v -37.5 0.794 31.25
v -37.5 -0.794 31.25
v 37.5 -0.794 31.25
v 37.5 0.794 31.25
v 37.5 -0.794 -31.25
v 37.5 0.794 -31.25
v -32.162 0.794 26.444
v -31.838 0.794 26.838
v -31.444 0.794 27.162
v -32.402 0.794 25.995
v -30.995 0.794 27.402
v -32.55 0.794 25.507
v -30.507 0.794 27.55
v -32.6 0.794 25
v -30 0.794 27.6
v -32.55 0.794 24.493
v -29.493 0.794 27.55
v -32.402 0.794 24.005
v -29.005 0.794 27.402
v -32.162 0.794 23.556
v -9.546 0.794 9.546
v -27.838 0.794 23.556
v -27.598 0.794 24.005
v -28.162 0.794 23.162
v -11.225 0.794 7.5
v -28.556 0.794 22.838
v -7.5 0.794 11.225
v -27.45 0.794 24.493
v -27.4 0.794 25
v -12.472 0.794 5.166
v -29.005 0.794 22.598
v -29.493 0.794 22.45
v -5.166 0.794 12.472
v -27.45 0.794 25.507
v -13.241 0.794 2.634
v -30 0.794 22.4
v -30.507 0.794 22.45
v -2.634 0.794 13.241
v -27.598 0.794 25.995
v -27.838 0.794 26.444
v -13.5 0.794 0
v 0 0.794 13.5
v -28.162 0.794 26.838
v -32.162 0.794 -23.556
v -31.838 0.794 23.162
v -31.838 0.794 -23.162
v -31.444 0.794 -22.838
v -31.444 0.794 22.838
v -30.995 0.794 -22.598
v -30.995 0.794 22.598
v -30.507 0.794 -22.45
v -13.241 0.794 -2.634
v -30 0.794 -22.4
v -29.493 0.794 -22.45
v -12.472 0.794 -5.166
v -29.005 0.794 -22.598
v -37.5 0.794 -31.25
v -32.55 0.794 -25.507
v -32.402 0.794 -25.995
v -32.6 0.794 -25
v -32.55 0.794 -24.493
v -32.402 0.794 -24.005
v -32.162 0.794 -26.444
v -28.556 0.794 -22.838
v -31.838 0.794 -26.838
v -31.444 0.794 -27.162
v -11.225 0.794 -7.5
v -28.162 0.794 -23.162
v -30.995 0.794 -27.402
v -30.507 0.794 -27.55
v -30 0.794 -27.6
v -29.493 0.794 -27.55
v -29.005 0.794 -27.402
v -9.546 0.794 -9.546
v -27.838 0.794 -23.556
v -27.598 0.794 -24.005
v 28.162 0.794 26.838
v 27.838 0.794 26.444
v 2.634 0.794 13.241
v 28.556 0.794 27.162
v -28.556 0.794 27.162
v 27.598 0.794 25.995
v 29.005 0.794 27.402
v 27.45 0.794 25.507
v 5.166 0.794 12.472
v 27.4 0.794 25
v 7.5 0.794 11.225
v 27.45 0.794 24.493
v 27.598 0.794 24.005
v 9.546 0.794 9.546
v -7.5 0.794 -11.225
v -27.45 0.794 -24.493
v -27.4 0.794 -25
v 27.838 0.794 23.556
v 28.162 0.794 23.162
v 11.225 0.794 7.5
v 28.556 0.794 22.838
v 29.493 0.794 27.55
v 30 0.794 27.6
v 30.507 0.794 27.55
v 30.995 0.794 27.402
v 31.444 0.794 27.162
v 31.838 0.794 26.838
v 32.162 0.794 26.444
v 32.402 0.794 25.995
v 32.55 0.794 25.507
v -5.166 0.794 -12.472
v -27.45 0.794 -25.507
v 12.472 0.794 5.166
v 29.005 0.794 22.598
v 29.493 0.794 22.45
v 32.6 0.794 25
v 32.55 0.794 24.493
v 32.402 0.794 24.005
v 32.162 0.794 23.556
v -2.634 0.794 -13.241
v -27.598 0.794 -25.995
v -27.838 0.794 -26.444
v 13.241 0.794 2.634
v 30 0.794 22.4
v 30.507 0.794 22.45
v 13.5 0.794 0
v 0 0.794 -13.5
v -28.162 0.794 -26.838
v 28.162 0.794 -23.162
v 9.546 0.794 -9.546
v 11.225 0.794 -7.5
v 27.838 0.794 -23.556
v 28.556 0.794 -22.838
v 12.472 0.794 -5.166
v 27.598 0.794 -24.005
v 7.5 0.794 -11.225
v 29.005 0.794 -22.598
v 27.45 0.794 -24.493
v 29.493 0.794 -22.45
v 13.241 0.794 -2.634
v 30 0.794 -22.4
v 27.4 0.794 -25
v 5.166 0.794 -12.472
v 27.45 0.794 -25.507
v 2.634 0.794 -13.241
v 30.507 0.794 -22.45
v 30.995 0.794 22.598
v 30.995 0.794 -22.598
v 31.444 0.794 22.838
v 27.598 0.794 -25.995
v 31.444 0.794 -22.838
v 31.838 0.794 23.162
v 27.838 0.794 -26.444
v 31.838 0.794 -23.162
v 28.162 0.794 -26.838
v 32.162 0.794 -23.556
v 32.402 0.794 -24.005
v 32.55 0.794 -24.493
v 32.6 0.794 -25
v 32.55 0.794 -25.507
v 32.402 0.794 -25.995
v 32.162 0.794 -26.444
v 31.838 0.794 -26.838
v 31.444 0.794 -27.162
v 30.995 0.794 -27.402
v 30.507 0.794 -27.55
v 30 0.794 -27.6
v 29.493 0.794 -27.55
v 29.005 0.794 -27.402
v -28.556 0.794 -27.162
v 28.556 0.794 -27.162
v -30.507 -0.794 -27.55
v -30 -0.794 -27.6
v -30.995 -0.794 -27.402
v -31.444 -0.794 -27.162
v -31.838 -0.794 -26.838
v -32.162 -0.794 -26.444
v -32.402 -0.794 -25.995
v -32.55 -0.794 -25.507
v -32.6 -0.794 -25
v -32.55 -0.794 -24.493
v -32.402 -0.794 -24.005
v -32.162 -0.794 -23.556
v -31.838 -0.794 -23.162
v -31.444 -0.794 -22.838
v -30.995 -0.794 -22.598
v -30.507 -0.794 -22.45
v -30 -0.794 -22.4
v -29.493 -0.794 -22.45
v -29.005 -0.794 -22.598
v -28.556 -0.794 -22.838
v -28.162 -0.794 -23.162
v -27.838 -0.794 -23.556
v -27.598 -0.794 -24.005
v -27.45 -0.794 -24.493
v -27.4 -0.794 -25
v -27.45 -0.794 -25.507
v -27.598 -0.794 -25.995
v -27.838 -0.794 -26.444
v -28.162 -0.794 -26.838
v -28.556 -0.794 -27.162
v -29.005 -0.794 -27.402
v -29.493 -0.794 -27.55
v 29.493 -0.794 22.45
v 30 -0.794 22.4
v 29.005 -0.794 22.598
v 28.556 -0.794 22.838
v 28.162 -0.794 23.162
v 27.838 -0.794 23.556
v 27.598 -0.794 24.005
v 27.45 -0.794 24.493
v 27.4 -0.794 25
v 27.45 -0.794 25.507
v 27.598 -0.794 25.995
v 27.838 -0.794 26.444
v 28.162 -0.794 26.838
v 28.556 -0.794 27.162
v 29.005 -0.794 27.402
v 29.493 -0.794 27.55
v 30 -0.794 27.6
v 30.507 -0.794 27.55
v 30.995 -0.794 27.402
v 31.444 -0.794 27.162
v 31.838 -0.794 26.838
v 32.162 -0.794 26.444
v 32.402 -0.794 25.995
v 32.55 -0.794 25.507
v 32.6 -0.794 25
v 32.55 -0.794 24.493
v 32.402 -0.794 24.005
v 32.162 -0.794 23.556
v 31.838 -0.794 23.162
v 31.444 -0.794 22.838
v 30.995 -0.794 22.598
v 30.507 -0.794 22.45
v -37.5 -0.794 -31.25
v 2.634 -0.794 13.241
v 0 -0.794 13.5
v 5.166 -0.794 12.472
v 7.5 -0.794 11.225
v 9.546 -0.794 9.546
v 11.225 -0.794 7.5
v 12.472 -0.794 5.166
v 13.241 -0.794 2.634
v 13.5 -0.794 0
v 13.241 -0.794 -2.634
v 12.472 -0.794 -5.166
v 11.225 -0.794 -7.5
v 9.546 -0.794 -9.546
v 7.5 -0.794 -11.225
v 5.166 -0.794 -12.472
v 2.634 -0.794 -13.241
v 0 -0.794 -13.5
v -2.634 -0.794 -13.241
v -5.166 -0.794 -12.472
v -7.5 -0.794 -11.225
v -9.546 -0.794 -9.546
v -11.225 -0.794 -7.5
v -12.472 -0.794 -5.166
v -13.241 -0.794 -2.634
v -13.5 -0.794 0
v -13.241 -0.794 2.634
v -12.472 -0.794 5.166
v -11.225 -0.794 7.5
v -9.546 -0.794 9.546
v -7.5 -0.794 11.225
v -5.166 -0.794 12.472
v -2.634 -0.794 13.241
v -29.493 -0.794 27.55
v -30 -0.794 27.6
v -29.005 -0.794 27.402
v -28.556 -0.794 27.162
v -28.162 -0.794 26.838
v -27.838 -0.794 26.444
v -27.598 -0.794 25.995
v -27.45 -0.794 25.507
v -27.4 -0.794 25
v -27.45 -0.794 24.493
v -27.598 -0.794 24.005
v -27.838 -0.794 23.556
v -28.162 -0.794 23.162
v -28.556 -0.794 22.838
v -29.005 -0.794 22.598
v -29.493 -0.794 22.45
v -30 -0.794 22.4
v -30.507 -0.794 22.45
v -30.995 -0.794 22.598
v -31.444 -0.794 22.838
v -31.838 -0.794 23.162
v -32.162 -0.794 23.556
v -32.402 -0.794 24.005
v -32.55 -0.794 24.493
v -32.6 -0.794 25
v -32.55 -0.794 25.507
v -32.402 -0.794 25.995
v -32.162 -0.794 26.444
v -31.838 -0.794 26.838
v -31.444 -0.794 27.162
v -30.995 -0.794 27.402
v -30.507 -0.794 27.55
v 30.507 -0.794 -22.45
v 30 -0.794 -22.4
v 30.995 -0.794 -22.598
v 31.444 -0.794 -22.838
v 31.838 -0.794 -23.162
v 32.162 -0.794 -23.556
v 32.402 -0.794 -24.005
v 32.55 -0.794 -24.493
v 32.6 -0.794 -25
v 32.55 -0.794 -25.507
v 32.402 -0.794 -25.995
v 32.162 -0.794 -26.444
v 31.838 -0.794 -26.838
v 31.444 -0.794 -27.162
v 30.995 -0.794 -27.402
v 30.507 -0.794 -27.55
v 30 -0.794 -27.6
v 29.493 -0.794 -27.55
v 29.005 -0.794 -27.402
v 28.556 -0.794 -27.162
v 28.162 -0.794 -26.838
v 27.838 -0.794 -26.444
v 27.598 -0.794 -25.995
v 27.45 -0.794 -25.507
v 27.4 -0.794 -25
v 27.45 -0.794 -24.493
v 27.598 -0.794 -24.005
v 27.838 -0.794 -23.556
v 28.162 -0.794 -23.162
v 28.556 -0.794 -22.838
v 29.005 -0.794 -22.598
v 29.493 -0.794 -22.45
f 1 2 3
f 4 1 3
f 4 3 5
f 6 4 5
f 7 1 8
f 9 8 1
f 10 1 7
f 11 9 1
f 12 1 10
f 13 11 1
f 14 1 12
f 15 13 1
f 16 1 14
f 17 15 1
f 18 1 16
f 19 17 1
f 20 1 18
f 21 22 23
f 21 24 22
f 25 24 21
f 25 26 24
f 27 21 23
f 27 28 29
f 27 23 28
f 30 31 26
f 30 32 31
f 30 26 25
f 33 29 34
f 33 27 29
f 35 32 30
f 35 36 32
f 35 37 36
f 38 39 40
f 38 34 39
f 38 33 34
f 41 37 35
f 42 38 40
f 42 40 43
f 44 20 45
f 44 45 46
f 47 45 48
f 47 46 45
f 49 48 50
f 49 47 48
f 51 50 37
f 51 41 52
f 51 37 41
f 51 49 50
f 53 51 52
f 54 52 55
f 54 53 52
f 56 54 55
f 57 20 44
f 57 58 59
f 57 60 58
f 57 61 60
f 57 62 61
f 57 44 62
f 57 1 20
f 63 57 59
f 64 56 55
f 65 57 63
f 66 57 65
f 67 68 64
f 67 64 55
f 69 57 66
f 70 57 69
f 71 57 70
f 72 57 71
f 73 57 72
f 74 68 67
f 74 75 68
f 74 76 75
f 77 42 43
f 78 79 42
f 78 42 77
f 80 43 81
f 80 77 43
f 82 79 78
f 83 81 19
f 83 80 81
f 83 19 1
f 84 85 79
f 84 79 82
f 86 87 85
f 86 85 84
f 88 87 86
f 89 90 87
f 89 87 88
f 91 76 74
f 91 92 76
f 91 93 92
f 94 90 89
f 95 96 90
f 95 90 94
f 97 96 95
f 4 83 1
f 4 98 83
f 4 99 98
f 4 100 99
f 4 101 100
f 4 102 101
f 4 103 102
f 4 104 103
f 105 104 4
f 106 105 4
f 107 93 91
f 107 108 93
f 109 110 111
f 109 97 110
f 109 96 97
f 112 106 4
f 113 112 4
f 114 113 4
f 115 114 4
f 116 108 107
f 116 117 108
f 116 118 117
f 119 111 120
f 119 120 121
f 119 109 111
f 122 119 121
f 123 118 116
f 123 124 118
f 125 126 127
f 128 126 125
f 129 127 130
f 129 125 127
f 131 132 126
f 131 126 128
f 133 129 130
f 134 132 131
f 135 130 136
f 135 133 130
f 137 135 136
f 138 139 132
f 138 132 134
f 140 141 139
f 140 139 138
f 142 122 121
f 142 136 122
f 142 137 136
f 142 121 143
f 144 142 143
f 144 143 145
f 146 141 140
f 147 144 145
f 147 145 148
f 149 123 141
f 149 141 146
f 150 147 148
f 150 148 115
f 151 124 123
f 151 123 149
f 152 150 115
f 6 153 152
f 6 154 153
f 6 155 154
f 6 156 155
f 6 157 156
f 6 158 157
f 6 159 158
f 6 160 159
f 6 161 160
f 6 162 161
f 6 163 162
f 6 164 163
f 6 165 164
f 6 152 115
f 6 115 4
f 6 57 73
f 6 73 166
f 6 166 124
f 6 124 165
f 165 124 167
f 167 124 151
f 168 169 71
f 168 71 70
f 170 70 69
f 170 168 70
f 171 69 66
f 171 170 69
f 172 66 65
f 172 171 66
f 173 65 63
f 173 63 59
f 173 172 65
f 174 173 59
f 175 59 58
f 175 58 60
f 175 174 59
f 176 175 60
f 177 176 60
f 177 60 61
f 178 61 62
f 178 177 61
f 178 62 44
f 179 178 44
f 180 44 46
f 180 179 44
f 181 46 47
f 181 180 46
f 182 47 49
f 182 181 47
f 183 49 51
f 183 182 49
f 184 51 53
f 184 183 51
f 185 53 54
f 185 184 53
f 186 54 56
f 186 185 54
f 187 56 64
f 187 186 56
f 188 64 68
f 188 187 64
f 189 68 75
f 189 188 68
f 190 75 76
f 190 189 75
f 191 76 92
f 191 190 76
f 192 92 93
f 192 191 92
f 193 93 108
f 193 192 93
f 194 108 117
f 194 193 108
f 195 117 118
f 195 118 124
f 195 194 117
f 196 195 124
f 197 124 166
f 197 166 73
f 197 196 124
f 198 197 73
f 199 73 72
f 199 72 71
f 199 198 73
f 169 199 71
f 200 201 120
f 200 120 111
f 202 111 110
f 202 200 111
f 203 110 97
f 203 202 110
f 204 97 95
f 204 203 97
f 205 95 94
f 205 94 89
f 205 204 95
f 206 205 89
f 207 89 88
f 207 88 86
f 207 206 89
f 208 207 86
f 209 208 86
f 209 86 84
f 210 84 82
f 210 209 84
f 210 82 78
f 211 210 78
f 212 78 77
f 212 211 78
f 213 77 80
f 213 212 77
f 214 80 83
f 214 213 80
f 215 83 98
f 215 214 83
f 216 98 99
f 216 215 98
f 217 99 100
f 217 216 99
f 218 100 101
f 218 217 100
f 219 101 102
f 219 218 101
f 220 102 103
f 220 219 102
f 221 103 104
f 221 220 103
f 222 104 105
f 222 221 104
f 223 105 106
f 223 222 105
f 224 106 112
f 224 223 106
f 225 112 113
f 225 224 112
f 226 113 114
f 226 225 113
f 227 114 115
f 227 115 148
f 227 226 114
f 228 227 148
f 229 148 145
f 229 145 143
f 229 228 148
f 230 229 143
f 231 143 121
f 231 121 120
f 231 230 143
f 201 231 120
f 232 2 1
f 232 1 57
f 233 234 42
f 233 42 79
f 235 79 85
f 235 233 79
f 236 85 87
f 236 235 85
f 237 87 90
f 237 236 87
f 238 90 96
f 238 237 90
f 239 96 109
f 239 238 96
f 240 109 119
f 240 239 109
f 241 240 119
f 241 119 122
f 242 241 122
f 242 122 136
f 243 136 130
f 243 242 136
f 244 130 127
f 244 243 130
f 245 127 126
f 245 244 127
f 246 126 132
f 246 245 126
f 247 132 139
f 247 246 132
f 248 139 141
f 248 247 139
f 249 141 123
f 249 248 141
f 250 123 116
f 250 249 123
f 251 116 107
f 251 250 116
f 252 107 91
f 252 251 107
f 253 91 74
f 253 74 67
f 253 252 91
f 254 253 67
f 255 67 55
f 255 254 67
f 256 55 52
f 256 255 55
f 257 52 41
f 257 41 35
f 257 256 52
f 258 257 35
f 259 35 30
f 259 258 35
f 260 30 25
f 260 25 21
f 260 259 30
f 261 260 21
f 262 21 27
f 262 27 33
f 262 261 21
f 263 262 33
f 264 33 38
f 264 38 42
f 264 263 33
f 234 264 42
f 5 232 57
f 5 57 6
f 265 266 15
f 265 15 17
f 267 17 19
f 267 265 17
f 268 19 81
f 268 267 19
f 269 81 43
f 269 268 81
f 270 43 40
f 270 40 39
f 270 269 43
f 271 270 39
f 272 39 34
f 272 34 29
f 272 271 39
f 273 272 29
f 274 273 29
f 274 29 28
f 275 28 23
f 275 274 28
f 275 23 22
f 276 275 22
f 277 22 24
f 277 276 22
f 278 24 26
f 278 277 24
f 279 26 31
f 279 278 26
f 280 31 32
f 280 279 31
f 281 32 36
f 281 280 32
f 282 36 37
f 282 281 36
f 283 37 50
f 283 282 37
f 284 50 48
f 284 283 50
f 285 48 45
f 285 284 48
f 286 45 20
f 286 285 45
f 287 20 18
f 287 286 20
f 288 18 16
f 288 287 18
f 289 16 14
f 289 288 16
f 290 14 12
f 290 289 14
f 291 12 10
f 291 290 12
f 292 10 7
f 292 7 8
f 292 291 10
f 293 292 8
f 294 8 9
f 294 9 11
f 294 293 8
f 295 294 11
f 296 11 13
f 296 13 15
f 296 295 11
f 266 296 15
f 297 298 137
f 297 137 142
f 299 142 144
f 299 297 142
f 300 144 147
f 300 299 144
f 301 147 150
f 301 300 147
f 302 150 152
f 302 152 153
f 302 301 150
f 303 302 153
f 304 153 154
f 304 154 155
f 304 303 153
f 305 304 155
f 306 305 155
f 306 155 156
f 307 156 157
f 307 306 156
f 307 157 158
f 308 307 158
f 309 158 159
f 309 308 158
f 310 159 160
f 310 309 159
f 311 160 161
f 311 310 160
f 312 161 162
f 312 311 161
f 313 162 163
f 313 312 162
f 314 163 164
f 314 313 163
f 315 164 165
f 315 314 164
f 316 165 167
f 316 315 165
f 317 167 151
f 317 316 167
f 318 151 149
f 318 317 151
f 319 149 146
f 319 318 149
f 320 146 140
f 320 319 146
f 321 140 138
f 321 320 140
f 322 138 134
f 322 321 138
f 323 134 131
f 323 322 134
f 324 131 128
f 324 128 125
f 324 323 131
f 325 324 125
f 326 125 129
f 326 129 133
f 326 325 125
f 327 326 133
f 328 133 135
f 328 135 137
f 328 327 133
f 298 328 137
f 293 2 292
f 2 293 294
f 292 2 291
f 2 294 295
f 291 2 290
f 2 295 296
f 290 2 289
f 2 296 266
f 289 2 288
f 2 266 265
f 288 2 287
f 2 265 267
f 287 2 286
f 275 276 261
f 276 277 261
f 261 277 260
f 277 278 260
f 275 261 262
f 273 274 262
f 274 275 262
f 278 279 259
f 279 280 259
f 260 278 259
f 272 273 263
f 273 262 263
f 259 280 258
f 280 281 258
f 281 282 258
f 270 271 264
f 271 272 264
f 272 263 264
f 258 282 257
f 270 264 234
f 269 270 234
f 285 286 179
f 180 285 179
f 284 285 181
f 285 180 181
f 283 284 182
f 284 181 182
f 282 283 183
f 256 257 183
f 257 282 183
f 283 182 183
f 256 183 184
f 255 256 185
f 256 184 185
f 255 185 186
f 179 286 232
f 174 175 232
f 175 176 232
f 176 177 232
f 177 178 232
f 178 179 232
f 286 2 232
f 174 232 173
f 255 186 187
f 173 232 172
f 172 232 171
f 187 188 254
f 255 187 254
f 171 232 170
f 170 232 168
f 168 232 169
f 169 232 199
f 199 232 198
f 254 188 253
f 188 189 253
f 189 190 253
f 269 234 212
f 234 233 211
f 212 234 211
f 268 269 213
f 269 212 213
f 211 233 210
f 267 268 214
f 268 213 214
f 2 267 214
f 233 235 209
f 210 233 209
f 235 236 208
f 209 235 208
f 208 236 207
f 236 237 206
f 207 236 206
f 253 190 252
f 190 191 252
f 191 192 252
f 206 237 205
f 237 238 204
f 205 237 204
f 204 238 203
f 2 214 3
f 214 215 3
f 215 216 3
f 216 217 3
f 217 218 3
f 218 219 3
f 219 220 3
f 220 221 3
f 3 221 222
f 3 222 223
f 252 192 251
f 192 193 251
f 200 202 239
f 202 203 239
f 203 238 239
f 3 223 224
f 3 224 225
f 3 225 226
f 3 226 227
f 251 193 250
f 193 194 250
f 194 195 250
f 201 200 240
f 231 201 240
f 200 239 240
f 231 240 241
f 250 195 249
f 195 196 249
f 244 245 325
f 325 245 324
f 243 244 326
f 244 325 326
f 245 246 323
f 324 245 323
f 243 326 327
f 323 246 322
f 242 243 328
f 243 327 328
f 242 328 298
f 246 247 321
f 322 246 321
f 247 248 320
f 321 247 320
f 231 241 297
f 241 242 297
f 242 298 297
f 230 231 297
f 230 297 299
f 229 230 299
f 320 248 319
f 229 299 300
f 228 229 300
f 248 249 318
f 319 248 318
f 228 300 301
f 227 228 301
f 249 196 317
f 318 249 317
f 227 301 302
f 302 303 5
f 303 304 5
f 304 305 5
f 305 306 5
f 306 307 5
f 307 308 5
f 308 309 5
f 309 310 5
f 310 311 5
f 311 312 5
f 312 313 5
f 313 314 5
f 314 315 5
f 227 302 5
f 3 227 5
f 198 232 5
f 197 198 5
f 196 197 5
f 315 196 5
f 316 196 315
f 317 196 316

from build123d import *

# Parameters (mm, degrees)
BOSS_EXTRUDE1_DEPTH      = 0.79375
BOSS_EXTRUDE1_DEPTH_BACK = 0.79375
SKETCH1_W                = 75
SKETCH1_H                = 62.5
SKETCH1_R                = 13.5
SKETCH1_R_2              = 2.6


with BuildPart() as part:
    # Sketch1 → Boss-Extrude1 (new, two sides: drawn at the far end of the back side and taken through both)
    with BuildSketch(Plane(origin=(0, 0, 0), x_dir=(1, 0, 0), z_dir=(0, 1, 0)).offset(-BOSS_EXTRUDE1_DEPTH_BACK)):
        Rectangle(SKETCH1_W, SKETCH1_H)
        Circle(SKETCH1_R, mode=Mode.SUBTRACT)
        with Locations((30, 25)):
            Circle(SKETCH1_R_2, mode=Mode.SUBTRACT)
        with Locations((-30, 25)):
            Circle(SKETCH1_R_2, mode=Mode.SUBTRACT)
        with Locations((30, -25)):
            Circle(SKETCH1_R_2, mode=Mode.SUBTRACT)
        with Locations((-30, -25)):
            Circle(SKETCH1_R_2, mode=Mode.SUBTRACT)
    extrude(amount=BOSS_EXTRUDE1_DEPTH + BOSS_EXTRUDE1_DEPTH_BACK)


solid = part.part
